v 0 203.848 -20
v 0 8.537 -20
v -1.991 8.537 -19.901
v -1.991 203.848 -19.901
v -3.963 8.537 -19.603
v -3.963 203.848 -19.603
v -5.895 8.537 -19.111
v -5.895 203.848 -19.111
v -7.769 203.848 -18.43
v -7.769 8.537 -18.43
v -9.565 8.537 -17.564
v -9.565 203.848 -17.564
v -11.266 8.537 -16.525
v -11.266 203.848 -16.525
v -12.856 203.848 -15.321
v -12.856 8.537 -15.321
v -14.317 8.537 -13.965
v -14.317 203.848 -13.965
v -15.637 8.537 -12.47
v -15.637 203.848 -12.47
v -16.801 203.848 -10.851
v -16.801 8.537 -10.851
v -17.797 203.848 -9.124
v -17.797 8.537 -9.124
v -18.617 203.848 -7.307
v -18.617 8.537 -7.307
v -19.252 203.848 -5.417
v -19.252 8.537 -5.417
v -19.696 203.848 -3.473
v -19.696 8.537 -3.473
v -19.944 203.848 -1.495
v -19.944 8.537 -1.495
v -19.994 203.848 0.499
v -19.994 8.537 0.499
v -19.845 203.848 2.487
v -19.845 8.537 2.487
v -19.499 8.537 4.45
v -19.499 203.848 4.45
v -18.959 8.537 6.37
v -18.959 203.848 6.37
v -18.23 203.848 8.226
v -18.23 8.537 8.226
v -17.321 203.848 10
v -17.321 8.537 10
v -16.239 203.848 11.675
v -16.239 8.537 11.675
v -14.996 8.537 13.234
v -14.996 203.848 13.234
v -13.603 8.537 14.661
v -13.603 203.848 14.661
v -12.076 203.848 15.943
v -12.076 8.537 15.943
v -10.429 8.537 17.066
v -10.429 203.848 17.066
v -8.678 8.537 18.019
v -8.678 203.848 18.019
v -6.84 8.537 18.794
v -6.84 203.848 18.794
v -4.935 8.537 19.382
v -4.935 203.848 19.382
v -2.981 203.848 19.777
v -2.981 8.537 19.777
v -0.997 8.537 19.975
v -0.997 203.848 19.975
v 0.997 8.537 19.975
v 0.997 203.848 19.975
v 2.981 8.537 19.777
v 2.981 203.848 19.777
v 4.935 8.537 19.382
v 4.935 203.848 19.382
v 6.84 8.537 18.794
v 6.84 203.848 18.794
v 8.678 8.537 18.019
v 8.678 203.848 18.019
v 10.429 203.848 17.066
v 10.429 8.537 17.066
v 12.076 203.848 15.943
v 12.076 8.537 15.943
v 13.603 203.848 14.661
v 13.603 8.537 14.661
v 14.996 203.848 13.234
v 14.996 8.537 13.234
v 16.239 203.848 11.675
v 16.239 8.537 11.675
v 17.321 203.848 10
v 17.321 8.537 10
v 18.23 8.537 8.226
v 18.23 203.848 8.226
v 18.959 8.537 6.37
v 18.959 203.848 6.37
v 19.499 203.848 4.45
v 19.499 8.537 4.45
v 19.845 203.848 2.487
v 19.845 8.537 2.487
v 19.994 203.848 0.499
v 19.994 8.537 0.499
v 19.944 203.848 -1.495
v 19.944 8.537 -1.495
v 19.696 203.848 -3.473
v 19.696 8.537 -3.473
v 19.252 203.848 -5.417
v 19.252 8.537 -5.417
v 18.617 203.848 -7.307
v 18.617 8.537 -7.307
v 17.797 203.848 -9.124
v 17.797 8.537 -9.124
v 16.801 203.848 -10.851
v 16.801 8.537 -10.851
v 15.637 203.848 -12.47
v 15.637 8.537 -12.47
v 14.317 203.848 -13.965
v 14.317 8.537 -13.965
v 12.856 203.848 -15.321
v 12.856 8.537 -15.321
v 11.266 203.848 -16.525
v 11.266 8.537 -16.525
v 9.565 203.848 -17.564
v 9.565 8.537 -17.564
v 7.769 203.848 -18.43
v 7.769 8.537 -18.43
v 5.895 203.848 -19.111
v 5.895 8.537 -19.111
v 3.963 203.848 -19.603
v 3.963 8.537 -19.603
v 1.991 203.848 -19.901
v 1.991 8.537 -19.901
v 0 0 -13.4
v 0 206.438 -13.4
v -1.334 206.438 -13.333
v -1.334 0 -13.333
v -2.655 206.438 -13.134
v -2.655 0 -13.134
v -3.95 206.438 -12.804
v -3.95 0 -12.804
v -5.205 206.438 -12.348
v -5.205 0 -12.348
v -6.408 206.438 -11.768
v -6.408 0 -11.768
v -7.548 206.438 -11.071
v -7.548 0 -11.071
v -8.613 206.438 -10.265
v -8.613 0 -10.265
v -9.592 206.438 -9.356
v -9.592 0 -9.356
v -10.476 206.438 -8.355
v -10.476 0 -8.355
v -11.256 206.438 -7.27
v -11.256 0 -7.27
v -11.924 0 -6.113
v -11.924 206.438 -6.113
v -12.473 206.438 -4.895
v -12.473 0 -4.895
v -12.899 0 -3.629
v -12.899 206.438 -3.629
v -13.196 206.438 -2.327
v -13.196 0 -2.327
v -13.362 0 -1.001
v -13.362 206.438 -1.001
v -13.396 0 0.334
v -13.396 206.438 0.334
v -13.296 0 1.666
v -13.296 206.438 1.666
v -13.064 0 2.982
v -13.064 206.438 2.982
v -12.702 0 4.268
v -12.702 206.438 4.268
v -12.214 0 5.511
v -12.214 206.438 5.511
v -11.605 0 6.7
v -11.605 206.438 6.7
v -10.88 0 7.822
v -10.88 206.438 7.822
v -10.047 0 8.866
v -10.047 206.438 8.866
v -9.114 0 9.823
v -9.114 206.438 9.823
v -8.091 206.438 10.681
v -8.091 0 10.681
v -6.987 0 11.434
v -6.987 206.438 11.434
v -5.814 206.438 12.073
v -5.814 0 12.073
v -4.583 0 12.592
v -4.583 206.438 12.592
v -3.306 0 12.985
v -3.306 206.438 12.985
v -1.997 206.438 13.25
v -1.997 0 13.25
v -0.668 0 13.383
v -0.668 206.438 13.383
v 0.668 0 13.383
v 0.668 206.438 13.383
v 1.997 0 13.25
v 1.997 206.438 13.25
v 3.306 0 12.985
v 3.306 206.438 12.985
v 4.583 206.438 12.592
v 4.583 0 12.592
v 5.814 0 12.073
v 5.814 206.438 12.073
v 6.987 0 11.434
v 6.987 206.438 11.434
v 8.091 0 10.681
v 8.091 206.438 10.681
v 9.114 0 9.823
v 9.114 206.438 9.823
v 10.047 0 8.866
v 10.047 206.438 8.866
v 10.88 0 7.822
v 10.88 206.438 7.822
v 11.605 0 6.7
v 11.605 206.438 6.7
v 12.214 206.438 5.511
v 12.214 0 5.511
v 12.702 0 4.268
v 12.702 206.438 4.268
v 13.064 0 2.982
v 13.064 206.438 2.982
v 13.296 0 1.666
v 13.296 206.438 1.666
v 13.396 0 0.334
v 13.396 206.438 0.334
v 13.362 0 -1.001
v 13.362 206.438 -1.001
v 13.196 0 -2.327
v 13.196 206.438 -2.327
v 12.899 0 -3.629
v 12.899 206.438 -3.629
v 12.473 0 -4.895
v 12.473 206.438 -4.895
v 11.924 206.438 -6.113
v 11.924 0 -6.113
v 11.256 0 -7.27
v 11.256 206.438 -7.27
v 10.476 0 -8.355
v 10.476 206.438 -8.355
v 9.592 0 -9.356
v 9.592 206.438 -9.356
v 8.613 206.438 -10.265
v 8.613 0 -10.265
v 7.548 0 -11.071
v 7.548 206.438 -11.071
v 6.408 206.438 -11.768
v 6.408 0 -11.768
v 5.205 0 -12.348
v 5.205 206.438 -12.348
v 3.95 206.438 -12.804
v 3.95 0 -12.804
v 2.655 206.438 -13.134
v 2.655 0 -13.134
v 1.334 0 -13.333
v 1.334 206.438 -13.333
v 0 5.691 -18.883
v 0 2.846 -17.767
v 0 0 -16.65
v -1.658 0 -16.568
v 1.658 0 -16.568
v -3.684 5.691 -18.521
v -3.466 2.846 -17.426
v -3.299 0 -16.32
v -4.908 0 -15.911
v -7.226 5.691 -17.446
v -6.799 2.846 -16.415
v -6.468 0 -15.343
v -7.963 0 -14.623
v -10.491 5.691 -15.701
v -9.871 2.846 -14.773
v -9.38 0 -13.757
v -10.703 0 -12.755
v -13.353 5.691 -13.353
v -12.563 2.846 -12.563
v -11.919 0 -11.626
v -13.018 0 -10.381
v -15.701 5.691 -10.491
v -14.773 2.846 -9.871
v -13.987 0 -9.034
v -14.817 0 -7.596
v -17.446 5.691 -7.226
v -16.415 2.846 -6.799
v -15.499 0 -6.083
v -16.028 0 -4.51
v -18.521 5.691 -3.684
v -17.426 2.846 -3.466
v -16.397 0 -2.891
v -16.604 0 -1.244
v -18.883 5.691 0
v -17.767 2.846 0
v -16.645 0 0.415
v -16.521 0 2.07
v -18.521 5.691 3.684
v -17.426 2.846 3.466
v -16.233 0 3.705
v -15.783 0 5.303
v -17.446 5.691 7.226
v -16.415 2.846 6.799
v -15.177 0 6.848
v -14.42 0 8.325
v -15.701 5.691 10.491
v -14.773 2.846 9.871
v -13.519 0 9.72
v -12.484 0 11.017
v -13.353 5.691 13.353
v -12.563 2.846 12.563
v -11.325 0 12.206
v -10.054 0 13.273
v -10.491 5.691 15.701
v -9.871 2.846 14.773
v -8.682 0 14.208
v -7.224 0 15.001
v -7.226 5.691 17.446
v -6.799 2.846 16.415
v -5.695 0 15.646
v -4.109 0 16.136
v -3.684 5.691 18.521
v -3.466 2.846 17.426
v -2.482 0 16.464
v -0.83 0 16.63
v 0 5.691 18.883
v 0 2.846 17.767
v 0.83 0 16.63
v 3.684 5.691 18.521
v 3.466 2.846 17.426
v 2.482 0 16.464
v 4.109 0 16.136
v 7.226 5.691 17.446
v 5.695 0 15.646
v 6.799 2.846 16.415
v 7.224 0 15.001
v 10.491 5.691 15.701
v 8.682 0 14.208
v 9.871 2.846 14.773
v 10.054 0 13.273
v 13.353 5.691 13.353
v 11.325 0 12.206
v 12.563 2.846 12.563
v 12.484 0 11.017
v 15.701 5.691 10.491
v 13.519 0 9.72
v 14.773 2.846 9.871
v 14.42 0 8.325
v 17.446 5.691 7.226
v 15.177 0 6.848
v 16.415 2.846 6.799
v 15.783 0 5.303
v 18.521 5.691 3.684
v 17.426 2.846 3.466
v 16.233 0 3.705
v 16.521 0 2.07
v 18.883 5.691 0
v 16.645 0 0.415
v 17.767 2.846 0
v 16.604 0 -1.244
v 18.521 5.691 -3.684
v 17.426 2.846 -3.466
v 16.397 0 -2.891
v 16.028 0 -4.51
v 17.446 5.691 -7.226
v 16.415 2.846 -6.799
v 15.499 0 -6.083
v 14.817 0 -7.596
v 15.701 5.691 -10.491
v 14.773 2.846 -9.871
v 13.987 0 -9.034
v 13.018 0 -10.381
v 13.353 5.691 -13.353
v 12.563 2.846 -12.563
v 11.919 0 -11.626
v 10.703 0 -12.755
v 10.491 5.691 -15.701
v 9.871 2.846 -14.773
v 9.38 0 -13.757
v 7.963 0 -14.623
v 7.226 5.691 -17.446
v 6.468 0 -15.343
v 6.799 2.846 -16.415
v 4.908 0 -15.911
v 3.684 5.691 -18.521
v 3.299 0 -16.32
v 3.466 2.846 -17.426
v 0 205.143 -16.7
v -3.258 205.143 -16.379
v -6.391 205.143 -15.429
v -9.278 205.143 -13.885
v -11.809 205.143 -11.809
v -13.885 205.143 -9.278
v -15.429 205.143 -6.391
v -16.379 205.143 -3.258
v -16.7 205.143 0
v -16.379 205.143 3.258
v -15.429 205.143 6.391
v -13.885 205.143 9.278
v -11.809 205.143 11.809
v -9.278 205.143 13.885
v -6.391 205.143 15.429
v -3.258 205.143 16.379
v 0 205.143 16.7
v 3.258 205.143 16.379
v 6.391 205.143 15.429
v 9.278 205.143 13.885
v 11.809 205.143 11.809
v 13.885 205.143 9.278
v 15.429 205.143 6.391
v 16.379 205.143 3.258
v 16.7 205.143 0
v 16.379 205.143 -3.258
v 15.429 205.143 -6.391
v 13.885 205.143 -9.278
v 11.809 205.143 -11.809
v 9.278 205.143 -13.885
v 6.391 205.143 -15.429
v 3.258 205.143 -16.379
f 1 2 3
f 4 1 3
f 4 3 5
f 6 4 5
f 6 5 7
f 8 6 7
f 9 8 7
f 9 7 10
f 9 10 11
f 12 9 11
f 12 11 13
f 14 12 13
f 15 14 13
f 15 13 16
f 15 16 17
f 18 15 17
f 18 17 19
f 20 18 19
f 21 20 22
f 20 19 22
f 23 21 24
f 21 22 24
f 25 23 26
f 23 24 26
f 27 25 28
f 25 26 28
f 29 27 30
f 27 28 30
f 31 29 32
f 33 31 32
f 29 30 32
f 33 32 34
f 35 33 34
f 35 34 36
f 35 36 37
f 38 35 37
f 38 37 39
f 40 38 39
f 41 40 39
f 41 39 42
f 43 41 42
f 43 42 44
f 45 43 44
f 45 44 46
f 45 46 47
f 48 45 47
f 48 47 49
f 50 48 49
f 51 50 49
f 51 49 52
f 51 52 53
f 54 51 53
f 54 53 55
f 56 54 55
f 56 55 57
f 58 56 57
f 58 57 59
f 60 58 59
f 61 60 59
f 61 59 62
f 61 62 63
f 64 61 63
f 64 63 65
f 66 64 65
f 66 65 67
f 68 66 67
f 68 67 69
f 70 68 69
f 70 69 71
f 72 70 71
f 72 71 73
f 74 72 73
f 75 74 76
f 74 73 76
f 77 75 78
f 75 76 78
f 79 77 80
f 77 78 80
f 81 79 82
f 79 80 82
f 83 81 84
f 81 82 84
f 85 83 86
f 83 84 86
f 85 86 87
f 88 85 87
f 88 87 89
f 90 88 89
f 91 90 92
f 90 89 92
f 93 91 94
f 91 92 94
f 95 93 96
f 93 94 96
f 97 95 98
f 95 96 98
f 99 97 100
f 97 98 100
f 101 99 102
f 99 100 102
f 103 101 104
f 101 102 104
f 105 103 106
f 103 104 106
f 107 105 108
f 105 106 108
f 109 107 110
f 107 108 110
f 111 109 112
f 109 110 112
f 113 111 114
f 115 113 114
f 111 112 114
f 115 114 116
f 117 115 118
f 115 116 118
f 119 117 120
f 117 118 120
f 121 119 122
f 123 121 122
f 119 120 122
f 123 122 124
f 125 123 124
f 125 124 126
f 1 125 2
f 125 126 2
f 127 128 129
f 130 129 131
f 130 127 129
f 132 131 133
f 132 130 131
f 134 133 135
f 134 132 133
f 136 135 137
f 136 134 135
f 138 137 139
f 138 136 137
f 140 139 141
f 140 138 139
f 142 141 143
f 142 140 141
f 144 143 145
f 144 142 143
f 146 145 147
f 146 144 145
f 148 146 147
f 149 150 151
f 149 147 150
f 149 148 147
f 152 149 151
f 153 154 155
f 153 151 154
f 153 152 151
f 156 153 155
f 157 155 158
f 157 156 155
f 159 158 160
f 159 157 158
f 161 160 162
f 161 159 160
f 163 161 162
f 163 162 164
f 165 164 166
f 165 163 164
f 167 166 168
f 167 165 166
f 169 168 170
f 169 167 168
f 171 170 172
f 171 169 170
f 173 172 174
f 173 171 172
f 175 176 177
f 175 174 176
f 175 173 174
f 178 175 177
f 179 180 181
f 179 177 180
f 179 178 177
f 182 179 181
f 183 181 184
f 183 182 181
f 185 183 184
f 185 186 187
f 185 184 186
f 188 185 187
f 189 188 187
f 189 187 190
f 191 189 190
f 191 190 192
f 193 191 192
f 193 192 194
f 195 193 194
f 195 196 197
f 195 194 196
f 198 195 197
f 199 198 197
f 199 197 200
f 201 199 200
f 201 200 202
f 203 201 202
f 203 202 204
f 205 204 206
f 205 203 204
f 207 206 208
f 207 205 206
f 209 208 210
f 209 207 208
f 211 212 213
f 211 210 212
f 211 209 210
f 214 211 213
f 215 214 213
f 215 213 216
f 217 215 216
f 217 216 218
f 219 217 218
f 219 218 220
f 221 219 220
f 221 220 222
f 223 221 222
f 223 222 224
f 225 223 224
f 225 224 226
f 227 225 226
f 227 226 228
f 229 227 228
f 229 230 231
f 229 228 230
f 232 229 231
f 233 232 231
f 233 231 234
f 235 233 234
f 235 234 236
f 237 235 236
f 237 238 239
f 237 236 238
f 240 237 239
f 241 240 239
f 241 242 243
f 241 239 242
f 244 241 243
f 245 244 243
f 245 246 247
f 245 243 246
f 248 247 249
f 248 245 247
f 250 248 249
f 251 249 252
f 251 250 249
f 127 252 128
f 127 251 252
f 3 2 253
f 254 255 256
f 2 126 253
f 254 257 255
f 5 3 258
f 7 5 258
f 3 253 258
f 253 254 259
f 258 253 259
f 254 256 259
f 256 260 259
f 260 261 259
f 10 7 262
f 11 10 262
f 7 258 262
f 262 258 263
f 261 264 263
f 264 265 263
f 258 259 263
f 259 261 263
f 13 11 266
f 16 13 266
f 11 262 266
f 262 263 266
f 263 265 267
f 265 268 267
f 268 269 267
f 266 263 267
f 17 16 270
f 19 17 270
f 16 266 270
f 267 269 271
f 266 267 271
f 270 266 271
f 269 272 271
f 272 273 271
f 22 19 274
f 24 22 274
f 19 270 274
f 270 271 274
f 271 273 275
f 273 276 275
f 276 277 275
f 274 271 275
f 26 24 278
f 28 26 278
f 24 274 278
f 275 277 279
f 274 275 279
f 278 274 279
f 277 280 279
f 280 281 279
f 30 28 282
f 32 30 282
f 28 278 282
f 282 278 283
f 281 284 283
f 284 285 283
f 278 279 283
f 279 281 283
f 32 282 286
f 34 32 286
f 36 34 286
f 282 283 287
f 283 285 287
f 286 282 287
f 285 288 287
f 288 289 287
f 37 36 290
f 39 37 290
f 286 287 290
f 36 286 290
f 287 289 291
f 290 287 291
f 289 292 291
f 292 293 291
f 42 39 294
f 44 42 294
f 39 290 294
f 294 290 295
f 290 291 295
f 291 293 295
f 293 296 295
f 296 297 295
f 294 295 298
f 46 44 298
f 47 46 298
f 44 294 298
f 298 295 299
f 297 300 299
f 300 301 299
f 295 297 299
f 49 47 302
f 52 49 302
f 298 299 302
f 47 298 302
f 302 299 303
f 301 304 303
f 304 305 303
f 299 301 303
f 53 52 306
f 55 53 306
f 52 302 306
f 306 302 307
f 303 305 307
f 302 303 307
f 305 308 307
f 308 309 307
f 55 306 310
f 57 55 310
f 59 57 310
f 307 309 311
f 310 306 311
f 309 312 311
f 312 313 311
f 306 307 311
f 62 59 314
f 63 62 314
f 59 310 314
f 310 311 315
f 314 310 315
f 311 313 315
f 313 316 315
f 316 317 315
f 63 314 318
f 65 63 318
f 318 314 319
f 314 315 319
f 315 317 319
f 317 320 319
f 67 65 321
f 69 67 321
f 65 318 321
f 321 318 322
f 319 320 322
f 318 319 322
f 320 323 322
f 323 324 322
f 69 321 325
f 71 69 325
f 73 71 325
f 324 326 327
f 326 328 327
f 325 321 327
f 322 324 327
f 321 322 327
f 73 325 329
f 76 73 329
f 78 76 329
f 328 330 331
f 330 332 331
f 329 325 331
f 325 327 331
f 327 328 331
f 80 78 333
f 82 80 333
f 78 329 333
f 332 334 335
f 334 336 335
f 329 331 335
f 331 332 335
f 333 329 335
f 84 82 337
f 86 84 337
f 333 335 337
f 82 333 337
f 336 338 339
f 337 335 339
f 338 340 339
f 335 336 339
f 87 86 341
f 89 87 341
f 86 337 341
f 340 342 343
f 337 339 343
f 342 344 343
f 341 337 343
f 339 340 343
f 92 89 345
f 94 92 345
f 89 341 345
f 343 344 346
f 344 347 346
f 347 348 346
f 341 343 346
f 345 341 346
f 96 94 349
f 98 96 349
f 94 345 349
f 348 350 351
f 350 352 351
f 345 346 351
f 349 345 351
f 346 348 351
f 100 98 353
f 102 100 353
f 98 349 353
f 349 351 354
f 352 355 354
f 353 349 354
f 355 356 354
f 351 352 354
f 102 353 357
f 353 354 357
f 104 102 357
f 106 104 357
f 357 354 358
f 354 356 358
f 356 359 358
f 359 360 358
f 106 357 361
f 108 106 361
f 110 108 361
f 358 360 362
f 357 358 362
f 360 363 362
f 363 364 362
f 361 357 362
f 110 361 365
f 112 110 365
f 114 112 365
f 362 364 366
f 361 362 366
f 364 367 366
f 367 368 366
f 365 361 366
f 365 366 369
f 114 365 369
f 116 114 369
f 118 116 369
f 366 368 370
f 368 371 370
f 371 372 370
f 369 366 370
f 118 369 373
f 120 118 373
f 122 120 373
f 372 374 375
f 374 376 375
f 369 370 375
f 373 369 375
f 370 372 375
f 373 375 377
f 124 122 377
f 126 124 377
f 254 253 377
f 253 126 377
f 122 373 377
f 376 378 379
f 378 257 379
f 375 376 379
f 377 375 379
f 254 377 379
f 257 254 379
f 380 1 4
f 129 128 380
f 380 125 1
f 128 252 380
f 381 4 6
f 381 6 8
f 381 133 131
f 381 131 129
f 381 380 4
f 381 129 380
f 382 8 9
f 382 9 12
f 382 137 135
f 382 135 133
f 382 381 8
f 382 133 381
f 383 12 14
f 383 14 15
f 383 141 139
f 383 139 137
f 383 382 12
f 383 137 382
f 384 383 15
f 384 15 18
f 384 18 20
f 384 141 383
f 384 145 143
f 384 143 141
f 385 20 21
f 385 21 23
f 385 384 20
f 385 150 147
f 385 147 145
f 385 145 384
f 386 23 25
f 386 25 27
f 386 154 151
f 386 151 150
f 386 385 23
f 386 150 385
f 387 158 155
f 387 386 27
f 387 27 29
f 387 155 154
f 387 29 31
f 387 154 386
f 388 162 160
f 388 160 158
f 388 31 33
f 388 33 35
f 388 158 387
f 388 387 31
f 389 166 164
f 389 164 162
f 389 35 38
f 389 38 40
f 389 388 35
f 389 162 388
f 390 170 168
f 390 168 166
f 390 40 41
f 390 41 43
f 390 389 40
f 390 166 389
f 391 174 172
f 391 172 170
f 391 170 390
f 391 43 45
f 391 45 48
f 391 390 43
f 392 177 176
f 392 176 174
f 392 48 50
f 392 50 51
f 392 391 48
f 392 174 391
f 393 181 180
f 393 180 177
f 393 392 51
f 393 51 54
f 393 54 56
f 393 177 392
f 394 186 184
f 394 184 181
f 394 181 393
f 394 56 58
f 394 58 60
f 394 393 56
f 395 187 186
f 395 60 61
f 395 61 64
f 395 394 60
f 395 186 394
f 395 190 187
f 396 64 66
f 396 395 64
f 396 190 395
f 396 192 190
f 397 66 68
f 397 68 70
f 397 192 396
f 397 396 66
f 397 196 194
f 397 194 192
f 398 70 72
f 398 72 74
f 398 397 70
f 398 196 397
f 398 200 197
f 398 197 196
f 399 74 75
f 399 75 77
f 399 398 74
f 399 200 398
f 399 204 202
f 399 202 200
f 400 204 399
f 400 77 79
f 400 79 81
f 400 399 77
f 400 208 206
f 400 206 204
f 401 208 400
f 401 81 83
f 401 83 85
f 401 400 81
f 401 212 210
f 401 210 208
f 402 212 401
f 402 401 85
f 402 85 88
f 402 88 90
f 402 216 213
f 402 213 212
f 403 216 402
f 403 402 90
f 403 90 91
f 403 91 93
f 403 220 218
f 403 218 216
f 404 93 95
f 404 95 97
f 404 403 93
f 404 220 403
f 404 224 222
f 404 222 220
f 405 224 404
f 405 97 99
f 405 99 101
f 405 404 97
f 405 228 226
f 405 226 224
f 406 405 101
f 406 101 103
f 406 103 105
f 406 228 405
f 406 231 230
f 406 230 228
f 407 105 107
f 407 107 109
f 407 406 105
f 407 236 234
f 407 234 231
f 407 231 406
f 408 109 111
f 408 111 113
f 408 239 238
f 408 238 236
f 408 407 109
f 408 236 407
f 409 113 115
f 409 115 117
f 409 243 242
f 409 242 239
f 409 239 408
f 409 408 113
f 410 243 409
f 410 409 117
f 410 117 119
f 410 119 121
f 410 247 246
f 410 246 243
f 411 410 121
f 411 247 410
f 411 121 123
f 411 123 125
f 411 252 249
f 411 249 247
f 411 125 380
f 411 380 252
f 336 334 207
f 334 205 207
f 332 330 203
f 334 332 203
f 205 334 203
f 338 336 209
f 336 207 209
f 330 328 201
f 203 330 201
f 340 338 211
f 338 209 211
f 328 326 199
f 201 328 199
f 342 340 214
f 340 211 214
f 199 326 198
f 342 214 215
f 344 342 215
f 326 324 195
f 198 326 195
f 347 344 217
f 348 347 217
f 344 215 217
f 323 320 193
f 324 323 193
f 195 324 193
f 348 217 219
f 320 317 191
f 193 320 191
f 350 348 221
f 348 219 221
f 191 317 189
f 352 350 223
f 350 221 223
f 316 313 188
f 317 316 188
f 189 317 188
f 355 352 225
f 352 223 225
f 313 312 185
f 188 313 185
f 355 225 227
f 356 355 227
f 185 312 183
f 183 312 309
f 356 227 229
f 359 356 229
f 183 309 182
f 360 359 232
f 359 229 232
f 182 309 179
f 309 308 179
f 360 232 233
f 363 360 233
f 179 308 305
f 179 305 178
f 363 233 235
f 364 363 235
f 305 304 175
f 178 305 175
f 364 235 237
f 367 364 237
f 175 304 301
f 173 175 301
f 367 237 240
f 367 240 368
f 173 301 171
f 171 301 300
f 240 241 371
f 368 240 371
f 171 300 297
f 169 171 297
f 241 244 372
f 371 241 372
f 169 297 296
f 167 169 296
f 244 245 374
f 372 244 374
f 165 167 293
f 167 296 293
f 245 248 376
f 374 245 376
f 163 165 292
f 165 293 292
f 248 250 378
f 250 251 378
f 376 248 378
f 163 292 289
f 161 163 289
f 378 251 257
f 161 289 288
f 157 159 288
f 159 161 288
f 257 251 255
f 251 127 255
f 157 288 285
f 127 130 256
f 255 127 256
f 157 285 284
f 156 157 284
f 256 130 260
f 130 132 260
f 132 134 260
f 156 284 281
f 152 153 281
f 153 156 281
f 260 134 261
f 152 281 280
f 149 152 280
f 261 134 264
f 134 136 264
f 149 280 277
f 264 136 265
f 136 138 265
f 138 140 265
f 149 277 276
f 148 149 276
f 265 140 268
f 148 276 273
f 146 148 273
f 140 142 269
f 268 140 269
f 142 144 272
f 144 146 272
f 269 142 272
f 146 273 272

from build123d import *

# Parameters (mm, degrees)
SKETCH1_R           = 20
BOSS_EXTRUDE1_DEPTH = 207.198025
SKETCH2_R           = 13.399724126
CUT_EXTRUDE1_DEPTH  = 210.119634573
CHAMFER1_SIZE       = 3.349594
CHAMFER1_SIZE_2     = 8.537032


with BuildPart() as part:
    # Sketch1 → Boss-Extrude1 (new body)
    with BuildSketch(Plane(origin=(0, 0, 0), x_dir=(1, 0, 0), z_dir=(0, 1, 0))):
        with Locations(Location((0, 0, 0), (0, 0, 90))):
            Circle(SKETCH1_R)
    extrude(amount=BOSS_EXTRUDE1_DEPTH)

    # Sketch2 → Cut-Extrude1 (cut, through all)
    with BuildSketch(Plane(origin=(0, 0, 0), x_dir=(1, 0, 0), z_dir=(0, 1, 0))):
        with Locations(Location((0, 0, 0), (0, 0, 90))):
            Circle(SKETCH2_R)
    extrude(amount=CUT_EXTRUDE1_DEPTH, mode=Mode.SUBTRACT)

    # Chamfer1
    # the kernel refuses this chamfer: 8.537032, 3.349594 mm, written as the material it takes off along each edge
    with BuildSketch(Plane(origin=(0, 207.198025, 0), x_dir=(0, 0, -1), z_dir=(1, 0, 0))) as chamfer1_piece_1:
        Polygon((20, -CHAMFER1_SIZE), (20 - CHAMFER1_SIZE_2, 0), (20, 0), align=None)
    revolve(axis=Axis((0, 207.198025, 0), (0, 1, 0)), mode=Mode.SUBTRACT)
    with BuildSketch(Plane(origin=(0, 0, 0), x_dir=(0, 0, -1), z_dir=(1, 0, 0))) as chamfer1_piece_2:
        Polygon((20, CHAMFER1_SIZE_2), (20 - CHAMFER1_SIZE, 0), (20, 0), align=None)
    revolve(axis=Axis((0, 0, 0), (0, 1, 0)), mode=Mode.SUBTRACT)


solid = part.part
